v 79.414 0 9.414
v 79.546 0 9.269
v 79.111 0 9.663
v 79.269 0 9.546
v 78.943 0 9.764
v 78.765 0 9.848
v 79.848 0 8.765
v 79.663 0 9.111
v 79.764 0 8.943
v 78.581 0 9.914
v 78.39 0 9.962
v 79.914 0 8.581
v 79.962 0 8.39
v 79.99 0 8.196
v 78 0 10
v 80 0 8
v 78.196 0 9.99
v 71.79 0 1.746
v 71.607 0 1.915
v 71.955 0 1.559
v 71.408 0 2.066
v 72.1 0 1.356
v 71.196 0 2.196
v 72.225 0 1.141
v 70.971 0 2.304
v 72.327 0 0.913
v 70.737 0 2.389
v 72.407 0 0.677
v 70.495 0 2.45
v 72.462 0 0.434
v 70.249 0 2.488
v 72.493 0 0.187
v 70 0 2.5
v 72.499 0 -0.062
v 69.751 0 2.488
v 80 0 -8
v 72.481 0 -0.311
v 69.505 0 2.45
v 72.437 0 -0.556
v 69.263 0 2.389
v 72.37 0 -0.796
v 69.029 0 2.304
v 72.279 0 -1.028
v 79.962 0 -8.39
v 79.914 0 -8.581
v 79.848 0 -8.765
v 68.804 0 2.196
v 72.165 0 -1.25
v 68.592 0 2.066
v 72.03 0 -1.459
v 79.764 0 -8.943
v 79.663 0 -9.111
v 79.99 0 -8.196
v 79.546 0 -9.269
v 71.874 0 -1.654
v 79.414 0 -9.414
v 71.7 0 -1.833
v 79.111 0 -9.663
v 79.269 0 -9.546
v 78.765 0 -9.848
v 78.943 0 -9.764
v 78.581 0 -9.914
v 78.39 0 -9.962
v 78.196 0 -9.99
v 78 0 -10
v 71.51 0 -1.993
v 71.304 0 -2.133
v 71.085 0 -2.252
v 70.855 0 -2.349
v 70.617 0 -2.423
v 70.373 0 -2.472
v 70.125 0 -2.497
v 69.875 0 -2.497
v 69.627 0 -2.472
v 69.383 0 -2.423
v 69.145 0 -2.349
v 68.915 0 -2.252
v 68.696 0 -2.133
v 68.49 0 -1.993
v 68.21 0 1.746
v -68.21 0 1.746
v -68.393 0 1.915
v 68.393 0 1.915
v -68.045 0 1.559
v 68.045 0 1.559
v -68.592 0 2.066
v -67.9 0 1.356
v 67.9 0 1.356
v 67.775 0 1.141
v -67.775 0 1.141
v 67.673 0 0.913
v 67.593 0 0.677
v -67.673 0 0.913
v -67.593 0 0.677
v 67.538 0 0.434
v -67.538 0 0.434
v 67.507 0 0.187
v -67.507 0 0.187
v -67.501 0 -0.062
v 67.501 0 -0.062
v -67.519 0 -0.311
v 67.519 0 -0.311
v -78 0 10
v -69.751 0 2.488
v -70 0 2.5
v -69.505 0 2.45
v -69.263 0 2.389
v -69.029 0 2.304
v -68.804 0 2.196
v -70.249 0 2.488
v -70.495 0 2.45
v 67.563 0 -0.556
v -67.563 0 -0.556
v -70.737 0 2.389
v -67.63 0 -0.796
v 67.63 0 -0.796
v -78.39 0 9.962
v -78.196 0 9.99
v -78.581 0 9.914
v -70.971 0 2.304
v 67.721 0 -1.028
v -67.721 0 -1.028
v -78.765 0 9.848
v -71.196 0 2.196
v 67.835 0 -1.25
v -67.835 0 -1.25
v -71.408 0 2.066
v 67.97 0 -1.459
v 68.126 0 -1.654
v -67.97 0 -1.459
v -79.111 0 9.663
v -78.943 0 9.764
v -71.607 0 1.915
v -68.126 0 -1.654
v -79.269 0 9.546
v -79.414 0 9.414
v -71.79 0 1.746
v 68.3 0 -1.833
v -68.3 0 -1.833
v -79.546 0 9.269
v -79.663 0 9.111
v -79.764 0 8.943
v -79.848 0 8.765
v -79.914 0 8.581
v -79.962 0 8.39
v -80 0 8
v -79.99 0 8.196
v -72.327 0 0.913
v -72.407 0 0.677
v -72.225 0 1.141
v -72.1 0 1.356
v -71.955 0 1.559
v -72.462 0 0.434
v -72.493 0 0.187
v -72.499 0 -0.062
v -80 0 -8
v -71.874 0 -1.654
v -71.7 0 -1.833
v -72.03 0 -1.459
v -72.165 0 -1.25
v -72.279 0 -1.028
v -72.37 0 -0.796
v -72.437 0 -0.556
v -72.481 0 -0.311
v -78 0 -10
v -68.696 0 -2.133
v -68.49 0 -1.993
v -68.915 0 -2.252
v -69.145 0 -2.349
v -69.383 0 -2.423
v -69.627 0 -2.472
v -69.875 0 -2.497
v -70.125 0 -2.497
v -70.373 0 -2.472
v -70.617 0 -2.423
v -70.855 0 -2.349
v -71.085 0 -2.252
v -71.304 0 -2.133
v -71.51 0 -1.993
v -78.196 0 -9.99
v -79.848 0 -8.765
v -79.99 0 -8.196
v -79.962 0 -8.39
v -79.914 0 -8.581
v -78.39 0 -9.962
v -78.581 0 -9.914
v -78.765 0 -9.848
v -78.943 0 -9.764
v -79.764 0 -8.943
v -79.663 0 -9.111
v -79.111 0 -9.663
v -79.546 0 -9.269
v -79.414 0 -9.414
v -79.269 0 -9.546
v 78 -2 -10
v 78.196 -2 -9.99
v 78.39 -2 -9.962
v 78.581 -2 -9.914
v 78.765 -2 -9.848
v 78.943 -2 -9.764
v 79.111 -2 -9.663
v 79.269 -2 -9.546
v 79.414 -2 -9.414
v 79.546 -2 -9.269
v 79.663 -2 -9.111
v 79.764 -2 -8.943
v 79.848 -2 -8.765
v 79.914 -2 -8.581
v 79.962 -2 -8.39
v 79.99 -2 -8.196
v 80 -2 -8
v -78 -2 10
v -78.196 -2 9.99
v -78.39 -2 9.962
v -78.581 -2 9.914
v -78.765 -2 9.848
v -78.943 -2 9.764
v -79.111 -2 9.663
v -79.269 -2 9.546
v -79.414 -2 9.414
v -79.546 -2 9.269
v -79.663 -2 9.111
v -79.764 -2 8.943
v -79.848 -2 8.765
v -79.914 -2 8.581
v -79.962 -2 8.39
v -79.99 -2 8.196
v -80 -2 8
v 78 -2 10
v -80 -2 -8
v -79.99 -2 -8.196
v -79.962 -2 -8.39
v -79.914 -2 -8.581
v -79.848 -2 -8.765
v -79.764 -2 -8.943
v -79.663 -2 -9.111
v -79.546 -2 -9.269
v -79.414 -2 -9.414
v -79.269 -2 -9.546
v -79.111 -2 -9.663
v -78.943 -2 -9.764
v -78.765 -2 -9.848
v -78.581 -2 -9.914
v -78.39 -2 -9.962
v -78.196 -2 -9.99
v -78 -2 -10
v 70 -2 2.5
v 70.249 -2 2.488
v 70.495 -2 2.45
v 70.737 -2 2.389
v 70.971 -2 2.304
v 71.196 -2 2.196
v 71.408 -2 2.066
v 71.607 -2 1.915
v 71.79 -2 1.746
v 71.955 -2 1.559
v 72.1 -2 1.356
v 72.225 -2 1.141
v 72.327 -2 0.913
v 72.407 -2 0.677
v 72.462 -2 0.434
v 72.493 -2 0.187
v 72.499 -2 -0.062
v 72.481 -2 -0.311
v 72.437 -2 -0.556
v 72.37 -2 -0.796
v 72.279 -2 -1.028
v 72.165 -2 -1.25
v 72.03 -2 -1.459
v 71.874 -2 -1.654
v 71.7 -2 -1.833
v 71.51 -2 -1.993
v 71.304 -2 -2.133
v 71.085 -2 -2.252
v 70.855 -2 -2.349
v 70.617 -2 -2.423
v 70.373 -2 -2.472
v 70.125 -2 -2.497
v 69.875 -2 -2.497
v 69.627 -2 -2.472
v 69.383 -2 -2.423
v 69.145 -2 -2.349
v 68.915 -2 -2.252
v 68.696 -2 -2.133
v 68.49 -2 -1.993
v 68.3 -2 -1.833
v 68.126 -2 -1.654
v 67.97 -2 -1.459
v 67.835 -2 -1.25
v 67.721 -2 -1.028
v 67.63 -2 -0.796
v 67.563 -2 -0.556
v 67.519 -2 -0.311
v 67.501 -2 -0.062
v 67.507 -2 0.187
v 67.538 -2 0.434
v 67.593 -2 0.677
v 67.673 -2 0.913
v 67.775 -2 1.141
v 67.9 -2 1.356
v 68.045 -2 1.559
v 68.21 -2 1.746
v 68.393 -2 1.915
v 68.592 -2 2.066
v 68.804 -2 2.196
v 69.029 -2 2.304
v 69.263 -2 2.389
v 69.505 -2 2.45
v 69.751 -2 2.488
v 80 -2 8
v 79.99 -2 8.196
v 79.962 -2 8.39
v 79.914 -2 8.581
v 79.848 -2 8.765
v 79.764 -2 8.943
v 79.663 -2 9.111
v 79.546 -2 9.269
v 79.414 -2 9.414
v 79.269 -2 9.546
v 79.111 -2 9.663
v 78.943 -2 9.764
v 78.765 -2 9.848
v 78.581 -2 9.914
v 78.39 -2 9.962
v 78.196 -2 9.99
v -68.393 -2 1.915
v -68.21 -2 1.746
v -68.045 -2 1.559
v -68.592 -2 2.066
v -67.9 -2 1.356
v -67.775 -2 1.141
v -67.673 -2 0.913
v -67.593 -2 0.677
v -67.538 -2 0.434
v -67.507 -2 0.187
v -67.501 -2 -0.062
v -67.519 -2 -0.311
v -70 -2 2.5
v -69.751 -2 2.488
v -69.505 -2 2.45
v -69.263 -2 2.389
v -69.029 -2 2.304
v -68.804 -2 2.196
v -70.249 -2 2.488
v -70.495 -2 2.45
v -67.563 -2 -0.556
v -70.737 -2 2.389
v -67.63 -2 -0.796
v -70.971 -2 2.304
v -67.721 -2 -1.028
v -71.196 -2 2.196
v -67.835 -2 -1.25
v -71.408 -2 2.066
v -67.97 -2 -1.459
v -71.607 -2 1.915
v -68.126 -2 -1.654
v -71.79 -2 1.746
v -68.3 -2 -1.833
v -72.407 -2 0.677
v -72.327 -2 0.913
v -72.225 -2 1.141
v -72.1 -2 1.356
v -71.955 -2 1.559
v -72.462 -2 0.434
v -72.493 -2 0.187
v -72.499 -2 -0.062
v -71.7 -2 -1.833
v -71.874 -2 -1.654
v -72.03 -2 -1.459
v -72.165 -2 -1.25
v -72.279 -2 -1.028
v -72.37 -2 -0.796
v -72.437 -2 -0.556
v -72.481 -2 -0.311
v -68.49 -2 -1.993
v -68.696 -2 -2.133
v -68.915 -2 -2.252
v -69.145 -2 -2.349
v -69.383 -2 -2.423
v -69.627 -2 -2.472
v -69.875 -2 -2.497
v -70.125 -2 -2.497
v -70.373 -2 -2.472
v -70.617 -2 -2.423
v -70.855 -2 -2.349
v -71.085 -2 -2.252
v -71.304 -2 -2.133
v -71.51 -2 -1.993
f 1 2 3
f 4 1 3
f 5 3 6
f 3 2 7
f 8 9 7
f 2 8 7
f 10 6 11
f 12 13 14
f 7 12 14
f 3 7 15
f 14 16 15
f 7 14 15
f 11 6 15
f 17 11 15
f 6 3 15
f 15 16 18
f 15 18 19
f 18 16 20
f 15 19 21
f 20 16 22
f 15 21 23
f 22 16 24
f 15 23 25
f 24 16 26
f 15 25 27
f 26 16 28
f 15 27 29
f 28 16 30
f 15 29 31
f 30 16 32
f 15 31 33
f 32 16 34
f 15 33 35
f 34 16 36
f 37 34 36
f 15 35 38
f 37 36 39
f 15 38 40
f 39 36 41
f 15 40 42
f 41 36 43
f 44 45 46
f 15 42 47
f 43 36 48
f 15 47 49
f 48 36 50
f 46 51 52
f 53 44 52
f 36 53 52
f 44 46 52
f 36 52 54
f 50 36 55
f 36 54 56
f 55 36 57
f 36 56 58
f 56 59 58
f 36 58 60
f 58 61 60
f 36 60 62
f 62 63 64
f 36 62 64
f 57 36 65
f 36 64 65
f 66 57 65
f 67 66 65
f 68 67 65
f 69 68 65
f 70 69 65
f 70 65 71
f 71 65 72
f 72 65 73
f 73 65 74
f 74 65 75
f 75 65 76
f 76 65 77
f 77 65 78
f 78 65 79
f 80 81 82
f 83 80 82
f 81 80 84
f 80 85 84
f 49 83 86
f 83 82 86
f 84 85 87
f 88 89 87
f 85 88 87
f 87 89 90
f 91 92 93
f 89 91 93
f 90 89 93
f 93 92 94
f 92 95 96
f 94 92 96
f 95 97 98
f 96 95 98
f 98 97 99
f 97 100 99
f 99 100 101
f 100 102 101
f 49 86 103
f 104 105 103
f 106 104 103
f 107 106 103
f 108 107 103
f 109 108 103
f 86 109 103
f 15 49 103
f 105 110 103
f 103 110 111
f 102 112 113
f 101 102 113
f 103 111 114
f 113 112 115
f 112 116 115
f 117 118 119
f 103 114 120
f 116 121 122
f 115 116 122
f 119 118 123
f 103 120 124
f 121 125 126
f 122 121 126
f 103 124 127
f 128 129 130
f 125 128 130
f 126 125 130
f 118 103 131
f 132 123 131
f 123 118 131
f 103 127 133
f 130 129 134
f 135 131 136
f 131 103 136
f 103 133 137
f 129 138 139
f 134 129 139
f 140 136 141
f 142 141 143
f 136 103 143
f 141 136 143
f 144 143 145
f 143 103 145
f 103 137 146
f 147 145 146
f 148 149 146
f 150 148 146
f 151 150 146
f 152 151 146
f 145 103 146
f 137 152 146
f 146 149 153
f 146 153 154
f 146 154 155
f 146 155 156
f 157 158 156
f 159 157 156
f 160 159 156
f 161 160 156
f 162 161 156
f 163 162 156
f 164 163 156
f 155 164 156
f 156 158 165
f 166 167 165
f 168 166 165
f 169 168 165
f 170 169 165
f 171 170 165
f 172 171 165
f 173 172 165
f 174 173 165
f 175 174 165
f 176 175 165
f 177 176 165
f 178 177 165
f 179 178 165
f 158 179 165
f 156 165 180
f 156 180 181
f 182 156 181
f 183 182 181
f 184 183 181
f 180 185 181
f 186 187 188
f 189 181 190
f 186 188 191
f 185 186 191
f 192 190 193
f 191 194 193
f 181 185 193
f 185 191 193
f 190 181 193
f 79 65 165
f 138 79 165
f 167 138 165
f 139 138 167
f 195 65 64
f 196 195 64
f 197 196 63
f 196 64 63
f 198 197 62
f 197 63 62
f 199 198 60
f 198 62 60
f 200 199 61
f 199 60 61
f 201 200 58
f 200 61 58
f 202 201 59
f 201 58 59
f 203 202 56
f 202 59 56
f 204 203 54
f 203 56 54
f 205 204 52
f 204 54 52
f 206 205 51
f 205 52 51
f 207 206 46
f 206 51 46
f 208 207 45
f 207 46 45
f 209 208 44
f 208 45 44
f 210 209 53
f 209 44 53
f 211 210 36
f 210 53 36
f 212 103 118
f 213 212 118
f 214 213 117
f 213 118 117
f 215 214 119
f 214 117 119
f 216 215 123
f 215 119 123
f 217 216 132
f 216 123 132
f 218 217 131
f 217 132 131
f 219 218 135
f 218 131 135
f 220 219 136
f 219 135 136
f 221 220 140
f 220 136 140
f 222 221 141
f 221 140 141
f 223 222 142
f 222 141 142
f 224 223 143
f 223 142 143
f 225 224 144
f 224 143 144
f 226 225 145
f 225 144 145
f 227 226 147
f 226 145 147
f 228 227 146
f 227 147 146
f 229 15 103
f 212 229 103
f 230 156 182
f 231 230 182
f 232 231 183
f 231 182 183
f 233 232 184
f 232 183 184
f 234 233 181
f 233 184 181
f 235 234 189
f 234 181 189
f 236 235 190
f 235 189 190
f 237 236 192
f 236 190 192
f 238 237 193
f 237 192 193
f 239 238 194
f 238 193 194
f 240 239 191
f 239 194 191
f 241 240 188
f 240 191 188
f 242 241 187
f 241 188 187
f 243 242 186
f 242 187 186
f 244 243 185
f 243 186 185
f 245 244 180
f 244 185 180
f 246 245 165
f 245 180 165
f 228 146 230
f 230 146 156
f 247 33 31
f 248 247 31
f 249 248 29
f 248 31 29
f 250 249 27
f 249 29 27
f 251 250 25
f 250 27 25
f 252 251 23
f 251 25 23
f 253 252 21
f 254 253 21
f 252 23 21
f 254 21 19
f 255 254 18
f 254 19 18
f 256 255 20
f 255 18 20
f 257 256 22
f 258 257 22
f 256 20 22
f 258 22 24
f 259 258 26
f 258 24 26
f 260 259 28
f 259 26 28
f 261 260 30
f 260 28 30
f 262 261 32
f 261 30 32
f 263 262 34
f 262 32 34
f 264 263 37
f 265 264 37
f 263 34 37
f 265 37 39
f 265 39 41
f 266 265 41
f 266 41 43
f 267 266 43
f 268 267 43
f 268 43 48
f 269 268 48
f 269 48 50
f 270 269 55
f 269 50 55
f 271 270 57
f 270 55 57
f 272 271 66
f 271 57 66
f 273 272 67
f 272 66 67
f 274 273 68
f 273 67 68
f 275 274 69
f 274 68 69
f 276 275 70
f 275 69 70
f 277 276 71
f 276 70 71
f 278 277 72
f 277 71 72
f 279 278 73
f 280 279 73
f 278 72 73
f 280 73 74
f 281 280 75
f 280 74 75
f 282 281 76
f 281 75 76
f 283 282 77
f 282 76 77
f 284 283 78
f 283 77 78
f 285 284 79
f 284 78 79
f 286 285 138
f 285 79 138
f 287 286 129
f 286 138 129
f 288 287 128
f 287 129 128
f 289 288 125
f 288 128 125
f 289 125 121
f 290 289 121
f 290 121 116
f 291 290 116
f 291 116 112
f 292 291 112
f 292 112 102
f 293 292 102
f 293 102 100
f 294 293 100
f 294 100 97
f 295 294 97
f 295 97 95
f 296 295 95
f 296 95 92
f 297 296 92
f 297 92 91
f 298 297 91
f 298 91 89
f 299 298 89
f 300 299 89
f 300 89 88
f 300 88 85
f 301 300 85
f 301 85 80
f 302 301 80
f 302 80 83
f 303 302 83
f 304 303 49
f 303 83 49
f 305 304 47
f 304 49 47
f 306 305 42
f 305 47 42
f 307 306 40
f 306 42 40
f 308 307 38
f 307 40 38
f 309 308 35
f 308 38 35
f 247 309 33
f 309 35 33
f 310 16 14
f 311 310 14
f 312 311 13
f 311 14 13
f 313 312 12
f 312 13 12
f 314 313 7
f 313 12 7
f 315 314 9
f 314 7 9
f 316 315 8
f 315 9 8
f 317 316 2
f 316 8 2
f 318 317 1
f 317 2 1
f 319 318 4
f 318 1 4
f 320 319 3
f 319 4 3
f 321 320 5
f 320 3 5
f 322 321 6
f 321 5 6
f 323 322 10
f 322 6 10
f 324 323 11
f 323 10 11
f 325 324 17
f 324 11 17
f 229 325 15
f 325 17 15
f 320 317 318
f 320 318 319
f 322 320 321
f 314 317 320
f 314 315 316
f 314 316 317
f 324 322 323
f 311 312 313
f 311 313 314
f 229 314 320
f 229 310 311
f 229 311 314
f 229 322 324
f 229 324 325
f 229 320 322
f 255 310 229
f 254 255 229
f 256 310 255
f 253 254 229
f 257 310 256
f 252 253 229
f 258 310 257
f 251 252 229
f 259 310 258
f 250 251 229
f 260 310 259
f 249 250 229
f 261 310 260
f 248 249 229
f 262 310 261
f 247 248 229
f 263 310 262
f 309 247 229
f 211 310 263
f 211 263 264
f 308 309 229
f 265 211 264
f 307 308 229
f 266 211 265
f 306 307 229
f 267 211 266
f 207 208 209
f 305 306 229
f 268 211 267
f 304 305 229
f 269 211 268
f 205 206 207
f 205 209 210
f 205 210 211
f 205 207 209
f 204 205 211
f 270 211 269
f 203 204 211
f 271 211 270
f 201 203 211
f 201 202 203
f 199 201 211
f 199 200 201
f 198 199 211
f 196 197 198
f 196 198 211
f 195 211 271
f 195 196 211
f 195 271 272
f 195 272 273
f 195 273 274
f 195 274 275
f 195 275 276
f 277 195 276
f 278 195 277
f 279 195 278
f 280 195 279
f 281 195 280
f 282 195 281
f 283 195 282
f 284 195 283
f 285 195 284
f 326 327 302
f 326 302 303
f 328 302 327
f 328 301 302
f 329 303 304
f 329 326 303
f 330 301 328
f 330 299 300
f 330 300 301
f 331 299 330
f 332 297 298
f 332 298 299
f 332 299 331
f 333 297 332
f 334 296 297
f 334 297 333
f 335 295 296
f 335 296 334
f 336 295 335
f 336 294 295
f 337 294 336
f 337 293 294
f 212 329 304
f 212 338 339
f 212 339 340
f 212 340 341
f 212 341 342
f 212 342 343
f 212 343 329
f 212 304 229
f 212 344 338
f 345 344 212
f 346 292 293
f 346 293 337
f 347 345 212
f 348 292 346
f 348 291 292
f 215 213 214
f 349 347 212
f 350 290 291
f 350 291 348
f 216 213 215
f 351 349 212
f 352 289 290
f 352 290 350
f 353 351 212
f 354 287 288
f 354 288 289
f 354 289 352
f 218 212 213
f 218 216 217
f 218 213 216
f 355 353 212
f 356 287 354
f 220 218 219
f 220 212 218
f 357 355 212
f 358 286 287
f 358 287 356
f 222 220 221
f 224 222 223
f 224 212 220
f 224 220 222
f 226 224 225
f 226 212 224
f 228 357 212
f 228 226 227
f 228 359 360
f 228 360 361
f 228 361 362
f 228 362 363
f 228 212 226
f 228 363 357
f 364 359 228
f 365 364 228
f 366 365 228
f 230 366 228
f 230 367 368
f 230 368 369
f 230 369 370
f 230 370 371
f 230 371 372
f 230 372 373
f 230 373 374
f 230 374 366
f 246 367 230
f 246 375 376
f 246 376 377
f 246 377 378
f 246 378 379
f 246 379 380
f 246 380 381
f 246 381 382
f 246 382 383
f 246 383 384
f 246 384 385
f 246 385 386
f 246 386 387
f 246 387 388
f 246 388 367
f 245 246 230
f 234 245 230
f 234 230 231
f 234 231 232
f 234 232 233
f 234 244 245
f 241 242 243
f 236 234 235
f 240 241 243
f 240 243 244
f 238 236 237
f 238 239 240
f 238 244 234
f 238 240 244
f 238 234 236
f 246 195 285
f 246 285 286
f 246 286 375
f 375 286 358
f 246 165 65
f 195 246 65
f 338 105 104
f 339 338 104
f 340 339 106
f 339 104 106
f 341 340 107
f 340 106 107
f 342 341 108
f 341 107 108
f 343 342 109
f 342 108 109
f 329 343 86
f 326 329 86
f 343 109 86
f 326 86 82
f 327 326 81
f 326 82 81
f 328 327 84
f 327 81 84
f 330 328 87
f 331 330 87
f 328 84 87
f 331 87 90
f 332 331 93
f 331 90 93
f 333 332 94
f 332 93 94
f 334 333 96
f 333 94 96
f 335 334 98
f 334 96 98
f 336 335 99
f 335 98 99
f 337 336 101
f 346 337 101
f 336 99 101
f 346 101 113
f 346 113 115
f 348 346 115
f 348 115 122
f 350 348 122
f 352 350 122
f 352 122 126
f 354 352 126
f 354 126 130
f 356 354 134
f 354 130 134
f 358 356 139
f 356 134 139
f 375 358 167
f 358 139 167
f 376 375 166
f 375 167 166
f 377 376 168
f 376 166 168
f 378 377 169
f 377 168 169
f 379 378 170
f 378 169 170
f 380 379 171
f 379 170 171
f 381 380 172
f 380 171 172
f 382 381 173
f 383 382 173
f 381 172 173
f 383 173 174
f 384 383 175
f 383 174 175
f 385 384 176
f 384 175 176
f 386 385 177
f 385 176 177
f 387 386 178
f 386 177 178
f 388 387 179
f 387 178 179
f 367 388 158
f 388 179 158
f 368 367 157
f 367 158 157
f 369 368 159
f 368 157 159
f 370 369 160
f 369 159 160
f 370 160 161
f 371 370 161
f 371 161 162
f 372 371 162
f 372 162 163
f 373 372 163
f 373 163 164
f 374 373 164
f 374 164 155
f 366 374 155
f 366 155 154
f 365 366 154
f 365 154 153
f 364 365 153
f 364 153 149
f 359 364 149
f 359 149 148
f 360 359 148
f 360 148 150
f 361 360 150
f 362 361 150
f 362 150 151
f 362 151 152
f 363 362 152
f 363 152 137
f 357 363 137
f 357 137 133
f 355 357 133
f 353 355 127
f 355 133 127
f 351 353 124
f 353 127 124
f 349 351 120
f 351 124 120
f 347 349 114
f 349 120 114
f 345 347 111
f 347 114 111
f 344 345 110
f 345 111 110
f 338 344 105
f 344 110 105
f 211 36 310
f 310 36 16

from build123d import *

# Parameters (mm, degrees)
SKETCH_1_R             = 2.5
SM_BASE_FLANGE_1_DEPTH = 2


# Sheet-metal steps are written as plain solids
with BuildPart() as part:
    # Sketch 1 → 基体-法兰1 (new body)
    with BuildSketch(Plane(origin=(0, 0, 0), x_dir=(1, 0, 0), z_dir=(0, 1, 0))):
        with BuildLine():
            Line((-78, 10), (78, 10))
            ThreePointArc((78, 10), (79.414213562, 9.414213562), (80, 8))
            Line((80, 8), (80, -8))
            ThreePointArc((80, -8), (79.414213562, -9.414213562), (78, -10))
            Line((78, -10), (-78, -10))
            ThreePointArc((-78, -10), (-79.414213562, -9.414213562), (-80, -8))
            Line((-80, -8), (-80, 8))
            ThreePointArc((-80, 8), (-79.414213562, 9.414213562), (-78, 10))
        make_face()
        with Locations(Location((-70, 0, 0), (0, 0, 270))):
            Circle(SKETCH_1_R, mode=Mode.SUBTRACT)
        with Locations(Location((70, 0, 0), (0, 0, 270))):
            Circle(SKETCH_1_R, mode=Mode.SUBTRACT)
    extrude(amount=-SM_BASE_FLANGE_1_DEPTH)


solid = part.part
